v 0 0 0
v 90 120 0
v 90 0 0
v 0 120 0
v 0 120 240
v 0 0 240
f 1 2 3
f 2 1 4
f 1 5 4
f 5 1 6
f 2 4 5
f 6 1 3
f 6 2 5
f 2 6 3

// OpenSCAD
Door_stop_L = 40;
Door_stop_H = 30;
Door_stop_W = 60;

scale([3,2,8]) 
difference(){
cube([Door_stop_L,Door_stop_W,Door_stop_H]);
translate([0,0,Door_stop_H])
    rotate([0,45,0])
cube([Door_stop_L*2,Door_stop_W,Door_stop_H]);;
    
}
